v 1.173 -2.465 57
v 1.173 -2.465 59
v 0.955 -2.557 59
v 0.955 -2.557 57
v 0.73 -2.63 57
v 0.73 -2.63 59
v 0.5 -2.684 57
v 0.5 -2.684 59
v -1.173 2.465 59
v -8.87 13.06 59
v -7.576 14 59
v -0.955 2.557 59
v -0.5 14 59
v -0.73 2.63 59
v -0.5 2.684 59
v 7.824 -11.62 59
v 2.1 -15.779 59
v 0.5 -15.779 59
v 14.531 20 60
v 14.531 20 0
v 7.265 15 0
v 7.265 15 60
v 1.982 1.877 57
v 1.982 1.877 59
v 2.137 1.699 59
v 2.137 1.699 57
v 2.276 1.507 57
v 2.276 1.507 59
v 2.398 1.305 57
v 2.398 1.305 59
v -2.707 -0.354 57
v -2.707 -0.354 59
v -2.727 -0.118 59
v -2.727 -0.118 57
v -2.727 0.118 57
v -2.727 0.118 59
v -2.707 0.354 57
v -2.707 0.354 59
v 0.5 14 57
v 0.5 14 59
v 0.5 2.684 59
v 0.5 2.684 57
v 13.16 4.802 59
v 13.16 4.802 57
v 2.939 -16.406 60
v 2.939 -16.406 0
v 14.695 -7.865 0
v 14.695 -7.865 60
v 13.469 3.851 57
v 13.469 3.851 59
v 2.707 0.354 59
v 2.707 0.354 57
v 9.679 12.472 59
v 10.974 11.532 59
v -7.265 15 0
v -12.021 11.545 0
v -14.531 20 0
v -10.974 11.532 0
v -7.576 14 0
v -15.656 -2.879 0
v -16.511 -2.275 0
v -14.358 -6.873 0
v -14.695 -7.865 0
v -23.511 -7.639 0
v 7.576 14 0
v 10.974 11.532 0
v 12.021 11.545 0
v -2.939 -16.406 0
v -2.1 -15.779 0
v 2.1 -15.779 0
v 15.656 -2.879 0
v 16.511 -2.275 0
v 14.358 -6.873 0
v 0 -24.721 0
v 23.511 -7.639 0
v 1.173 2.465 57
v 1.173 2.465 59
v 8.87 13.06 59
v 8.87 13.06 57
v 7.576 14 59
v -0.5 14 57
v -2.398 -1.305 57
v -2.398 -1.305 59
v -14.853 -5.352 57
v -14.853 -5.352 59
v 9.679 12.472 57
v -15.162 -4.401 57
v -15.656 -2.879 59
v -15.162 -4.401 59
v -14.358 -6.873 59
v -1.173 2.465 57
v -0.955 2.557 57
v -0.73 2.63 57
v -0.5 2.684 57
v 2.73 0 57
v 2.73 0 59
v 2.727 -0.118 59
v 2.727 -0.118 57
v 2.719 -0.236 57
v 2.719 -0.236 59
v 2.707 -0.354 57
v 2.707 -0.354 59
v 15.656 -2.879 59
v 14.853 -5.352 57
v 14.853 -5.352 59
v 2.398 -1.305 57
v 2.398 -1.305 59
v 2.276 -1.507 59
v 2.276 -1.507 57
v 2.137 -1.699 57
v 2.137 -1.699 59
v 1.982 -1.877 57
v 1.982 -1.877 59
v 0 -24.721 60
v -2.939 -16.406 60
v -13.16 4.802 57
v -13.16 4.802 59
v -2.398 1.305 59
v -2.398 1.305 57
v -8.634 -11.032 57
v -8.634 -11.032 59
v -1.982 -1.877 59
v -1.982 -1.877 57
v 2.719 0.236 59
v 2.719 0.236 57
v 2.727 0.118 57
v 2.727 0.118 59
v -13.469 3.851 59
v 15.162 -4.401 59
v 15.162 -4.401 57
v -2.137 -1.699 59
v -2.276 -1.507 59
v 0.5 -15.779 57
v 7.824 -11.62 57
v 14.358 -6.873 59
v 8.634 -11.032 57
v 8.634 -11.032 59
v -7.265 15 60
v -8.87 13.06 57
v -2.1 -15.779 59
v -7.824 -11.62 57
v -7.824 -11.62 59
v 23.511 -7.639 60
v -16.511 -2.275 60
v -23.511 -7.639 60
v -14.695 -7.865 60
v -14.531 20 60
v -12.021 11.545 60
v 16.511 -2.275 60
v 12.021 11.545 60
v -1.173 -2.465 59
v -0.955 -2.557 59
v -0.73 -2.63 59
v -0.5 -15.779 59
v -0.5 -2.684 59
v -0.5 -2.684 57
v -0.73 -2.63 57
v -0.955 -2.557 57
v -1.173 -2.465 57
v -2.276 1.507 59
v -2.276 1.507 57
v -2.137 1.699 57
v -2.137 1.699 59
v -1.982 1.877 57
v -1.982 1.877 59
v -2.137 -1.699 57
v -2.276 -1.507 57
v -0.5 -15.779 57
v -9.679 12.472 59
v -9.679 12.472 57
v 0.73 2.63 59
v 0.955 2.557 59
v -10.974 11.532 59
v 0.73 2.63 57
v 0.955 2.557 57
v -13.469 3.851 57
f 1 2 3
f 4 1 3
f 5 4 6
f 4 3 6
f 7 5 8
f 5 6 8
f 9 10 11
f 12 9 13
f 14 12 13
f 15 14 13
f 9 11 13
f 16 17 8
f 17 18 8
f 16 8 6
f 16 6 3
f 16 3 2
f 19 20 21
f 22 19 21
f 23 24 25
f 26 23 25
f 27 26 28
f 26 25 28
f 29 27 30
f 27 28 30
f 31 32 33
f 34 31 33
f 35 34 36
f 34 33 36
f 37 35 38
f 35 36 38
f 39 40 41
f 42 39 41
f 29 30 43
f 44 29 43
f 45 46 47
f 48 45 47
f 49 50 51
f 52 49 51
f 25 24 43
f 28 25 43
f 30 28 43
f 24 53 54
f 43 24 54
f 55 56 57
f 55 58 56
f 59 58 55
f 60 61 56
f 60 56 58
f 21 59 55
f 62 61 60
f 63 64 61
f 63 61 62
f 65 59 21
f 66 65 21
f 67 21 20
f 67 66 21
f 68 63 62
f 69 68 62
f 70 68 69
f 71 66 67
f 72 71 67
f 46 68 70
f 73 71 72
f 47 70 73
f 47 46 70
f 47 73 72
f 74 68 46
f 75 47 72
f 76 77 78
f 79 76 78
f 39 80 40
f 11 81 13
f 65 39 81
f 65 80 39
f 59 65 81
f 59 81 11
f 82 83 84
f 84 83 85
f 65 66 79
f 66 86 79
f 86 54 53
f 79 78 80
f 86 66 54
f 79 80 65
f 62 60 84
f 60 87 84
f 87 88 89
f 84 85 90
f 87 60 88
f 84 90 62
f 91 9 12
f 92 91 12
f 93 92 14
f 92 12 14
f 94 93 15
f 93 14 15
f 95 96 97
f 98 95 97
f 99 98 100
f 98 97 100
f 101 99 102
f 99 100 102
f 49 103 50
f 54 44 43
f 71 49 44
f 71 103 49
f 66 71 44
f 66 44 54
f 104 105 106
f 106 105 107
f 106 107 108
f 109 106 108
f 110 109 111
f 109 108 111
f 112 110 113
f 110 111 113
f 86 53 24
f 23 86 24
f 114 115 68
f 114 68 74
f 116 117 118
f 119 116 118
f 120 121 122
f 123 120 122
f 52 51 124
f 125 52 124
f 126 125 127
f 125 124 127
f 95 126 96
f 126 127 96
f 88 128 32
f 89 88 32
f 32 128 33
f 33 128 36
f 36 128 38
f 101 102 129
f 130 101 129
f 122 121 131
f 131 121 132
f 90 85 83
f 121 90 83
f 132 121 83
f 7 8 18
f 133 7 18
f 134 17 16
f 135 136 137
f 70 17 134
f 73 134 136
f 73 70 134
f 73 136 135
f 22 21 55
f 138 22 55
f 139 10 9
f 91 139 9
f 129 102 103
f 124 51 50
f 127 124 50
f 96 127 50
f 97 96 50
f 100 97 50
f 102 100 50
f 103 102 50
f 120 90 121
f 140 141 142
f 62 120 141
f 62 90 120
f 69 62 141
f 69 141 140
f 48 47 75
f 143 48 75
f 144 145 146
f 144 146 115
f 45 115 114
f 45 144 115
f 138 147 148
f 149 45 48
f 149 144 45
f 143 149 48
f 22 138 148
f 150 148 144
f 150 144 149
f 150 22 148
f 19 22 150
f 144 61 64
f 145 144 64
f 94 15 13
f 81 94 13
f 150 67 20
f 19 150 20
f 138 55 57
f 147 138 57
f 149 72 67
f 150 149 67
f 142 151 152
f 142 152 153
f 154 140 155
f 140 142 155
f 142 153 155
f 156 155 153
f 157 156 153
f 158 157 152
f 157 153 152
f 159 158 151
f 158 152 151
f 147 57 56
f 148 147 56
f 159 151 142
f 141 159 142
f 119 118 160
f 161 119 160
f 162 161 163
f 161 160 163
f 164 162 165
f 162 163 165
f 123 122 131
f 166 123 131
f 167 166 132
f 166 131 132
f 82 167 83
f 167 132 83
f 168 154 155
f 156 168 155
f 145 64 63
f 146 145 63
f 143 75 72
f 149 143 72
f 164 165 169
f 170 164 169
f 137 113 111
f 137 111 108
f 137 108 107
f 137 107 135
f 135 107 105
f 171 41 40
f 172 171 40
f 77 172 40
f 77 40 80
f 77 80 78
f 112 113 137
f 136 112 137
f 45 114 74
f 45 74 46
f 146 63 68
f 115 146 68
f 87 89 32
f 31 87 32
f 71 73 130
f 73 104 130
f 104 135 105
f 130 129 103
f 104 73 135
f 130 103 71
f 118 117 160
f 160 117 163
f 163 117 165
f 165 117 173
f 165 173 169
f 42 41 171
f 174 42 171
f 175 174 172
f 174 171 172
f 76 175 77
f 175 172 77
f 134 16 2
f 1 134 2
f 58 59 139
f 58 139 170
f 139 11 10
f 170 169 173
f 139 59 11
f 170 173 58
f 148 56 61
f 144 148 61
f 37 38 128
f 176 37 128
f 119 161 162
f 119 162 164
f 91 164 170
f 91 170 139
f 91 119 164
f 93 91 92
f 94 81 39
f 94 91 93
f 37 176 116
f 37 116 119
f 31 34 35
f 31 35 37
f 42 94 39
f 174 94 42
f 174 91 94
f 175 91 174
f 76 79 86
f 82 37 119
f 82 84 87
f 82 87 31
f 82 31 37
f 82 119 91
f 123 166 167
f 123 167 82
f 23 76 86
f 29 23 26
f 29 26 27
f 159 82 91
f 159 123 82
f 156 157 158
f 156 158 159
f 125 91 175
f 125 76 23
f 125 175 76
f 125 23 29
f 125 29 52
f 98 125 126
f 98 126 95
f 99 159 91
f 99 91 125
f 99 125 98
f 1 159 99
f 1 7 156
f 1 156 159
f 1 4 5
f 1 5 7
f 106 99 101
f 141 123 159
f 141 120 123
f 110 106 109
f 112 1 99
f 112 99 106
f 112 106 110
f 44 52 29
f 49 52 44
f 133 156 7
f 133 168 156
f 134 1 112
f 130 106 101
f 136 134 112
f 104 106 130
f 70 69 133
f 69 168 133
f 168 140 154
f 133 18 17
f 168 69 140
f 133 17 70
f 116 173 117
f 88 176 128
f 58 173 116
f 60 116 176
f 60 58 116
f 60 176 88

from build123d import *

# Parameters (mm, degrees)
F1_DEPTH = 60
F2_T     = -1
F4_DEPTH = 59
F6_DEPTH = 2


with BuildPart() as f1:
    # F0 (on Top) → F1 (new body)
    with BuildSketch(Plane.XY):
        Polygon((-7.2654252801, 15), (-14.5308505601, 20), (-12.0207078615, 11.5450849719), (-10.8981379201, 15), align=None)
        Polygon((-10.8981379201, 15), (-12.0207078615, 11.5450849719), (-9.510565163, 3.0901699437), (-16.5109876273, -2.2745751406), (-17.6335575688, -5.7294901688), (-14.6946313073, -7.8647450844), (-5.8778525229, -8.0901699437), (-2.9389262615, -16.4057647469), (0, -18.5410196625), (2.9389262615, -16.4057647469), (5.8778525229, -8.0901699437), (14.6946313073, -7.8647450844), (17.6335575688, -5.7294901688), (16.5109876273, -2.2745751406), (9.510565163, 3.0901699437), (12.0207078615, 11.5450849719), (10.8981379201, 15), (7.2654252801, 15), (0, 10), (-7.2654252801, 15), align=None)
        Polygon((-9.510565163, 3.0901699437), (-12.0207078615, 11.5450849719), (-16.5109876273, -2.2745751406), align=None)
        Polygon((7.2654252801, 15), (-7.2654252801, 15), (0, 10), align=None)
        Polygon((-17.6335575688, -5.7294901688), (-16.5109876273, -2.2745751406), (-23.5114100917, -7.639320225), (-14.6946313073, -7.8647450844), align=None)
        Polygon((14.5308505601, 20), (7.2654252801, 15), (10.8981379201, 15), (12.0207078615, 11.5450849719), align=None)
        Polygon((-5.8778525229, -8.0901699437), (-14.6946313073, -7.8647450844), (-2.9389262615, -16.4057647469), align=None)
        Polygon((16.5109876273, -2.2745751406), (12.0207078615, 11.5450849719), (9.510565163, 3.0901699437), align=None)
        Polygon((0, -18.5410196625), (-2.9389262615, -16.4057647469), (0, -24.72135955), (2.9389262615, -16.4057647469), align=None)
        Polygon((23.5114100917, -7.639320225), (16.5109876273, -2.2745751406), (17.6335575688, -5.7294901688), (14.6946313073, -7.8647450844), align=None)
        Polygon((5.8778525229, -8.0901699437), (2.9389262615, -16.4057647469), (14.6946313073, -7.8647450844), align=None)
    extrude(amount=F1_DEPTH)

    # F2
    f2_openings = [f1.faces().sort_by_distance(p)[0] for p in [
        (0, 0, 0),
    ]]
    offset(amount=F2_T, openings=f2_openings, kind=Kind.INTERSECTION)

    # F3 (on face) → F4 (join, through all)
    with BuildSketch(Plane(origin=(0, 0, 59), x_dir=(1, 0, 0), z_dir=(0, 0, -1))):
        Polygon((-15.6559881063, 2.8792251681), (-14.3583265336, 6.8730168274), (-20.6573081254, 6.7119662811), align=None)
        Polygon((0, 21.7203791484), (-2.0996605306, 15.7794590151), (2.0996605306, 15.7794590151), align=None)
        Polygon((20.6573081254, 6.7119662811), (14.3583265336, 6.8730168274), (15.6559881063, 2.8792251681), align=None)
        Polygon((12.7669185376, -17.5721558553), (10.9735943499, -11.5317010106), (7.5762722465, -14), align=None)
        Polygon((-7.5762722465, -14), (-10.9735943499, -11.5317010106), (-12.7669185376, -17.5721558553), align=None)
    extrude(amount=F4_DEPTH)

    # F5 (on face) → F6 (join)
    with BuildSketch(Plane(origin=(0, 0, 59), x_dir=(1, 0, 0), z_dir=(0, 0, -1))):
        with BuildLine():
            ThreePointArc((-1.9818535798, 1.8771366278), (-2.208391982, 1.6044906934), (-2.3976894584, 1.3047876426))
            Line((-2.3976894584, 1.3047876426), (-1.3090169944, 0.9510565163))
            Line((-1.3090169944, 0.9510565163), (-1.9818535798, 1.8771366278))
        make_face()
        with BuildLine():
            Line((-1.3090169944, 0.9510565163), (-2.3976894584, 1.3047876426))
            ThreePointArc((-2.3976894584, 1.3047876426), (-2.5961204766, 0.8435306766), (-2.7067064528, 0.3537311263))
            Line((-2.7067064528, 0.3537311263), (-1.6180339887, 0))
            Line((-1.6180339887, 0), (-2.7067064528, -0.3537311263))
            ThreePointArc((-2.7067064528, -0.3537311263), (-2.5961204766, -0.8435306766), (-2.3976894584, -1.3047876426))
            Line((-2.3976894584, -1.3047876426), (-1.3090169944, -0.9510565163))
            Line((-1.3090169944, -0.9510565163), (-1.9818535798, -1.8771366278))
            ThreePointArc((-1.9818535798, -1.8771366278), (-1.6044906934, -2.208391982), (-1.1728365854, -2.4649218801))
            Line((-1.1728365854, -2.4649218801), (-0.5, -1.5388417686))
            Line((-0.5, -1.5388417686), (-0.5, -2.6835397391))
            ThreePointArc((-0.5, -2.6835397391), (1.21e-08, -2.7297226107), (0.5000000237, -2.6835397347))
            Line((0.5000000237, -2.6835397347), (0.5000000237, -1.5388418013))
            Line((0.5000000237, -1.5388418013), (1.1728365854, -2.4649218801))
            ThreePointArc((1.1728365854, -2.4649218801), (1.6044906934, -2.208391982), (1.9818535798, -1.8771366278))
            Line((1.9818535798, -1.8771366278), (1.3090169944, -0.9510565163))
            Line((1.3090169944, -0.9510565163), (2.3976894584, -1.3047876426))
            ThreePointArc((2.3976894584, -1.3047876426), (2.5961204766, -0.8435306766), (2.7067064528, -0.3537311263))
            Line((2.7067064528, -0.3537311263), (1.6180339887, 0))
            Line((1.6180339887, 0), (2.7067064528, 0.3537311263))
            ThreePointArc((2.7067064528, 0.3537311263), (2.5961204766, 0.8435306766), (2.3976894584, 1.3047876426))
            Line((2.3976894584, 1.3047876426), (1.3090169944, 0.9510565163))
            Line((1.3090169944, 0.9510565163), (1.9818535798, 1.8771366278))
            ThreePointArc((1.9818535798, 1.8771366278), (1.6044906934, 2.208391982), (1.1728365854, 2.4649218801))
            Line((1.1728365854, 2.4649218801), (0.5, 1.5388417686))
            Line((0.5, 1.5388417686), (0.5, 2.6835397391))
            ThreePointArc((0.5, 2.6835397391), (0, 2.7297226107), (-0.5, 2.6835397391))
            Line((-0.5, 2.6835397391), (-0.5, 1.5388417686))
            Line((-0.5, 1.5388417686), (-1.1728365854, 2.4649218801))
            ThreePointArc((-1.1728365854, 2.4649218801), (-1.6044906934, 2.208391982), (-1.9818535798, 1.8771366278))
            Line((-1.9818535798, 1.8771366278), (-1.3090169944, 0.9510565163))
        make_face()
        with BuildLine():
            Line((-1.6180339887, 0), (-2.7067064528, 0.3537311263))
            ThreePointArc((-2.7067064528, 0.3537311263), (-2.7297226107, 0), (-2.7067064528, -0.3537311263))
            Line((-2.7067064528, -0.3537311263), (-1.6180339887, 0))
        make_face()
        with BuildLine():
            ThreePointArc((-0.5, 2.6835397391), (-0.8435306766, 2.5961204766), (-1.1728365854, 2.4649218801))
            Line((-1.1728365854, 2.4649218801), (-0.5, 1.5388417686))
            Line((-0.5, 1.5388417686), (-0.5, 2.6835397391))
        make_face()
        with BuildLine():
            Line((-1.3090169944, -0.9510565163), (-2.3976894584, -1.3047876426))
            ThreePointArc((-2.3976894584, -1.3047876426), (-2.208391982, -1.6044906934), (-1.9818535798, -1.8771366278))
            Line((-1.9818535798, -1.8771366278), (-1.3090169944, -0.9510565163))
        make_face()
        with BuildLine():
            ThreePointArc((1.1728365854, 2.4649218801), (0.8435306766, 2.5961204766), (0.5, 2.6835397391))
            Line((0.5, 2.6835397391), (0.5, 1.5388417686))
            Line((0.5, 1.5388417686), (1.1728365854, 2.4649218801))
        make_face()
        with BuildLine():
            Line((-0.5, -1.5388417686), (-1.1728365854, -2.4649218801))
            ThreePointArc((-1.1728365854, -2.4649218801), (-0.8435306766, -2.5961204766), (-0.5, -2.6835397391))
            Line((-0.5, -2.6835397391), (-0.5, -1.5388417686))
        make_face()
        with BuildLine():
            ThreePointArc((2.3976894584, 1.3047876426), (2.208391982, 1.6044906934), (1.9818535798, 1.8771366278))
            Line((1.9818535798, 1.8771366278), (1.3090169944, 0.9510565163))
            Line((1.3090169944, 0.9510565163), (2.3976894584, 1.3047876426))
        make_face()
        with BuildLine():
            Line((0.5000000237, -1.5388418013), (0.5000000237, -2.6835397347))
            ThreePointArc((0.5000000237, -2.6835397347), (0.8435306881, -2.5961204728), (1.1728365854, -2.4649218801))
            Line((1.1728365854, -2.4649218801), (0.5000000237, -1.5388418013))
        make_face()
        with BuildLine():
            ThreePointArc((2.7297226107, 0), (2.7239624938, 0.1772395647), (2.7067064528, 0.3537311263))
            Line((2.7067064528, 0.3537311263), (1.6180339887, 0))
            Line((1.6180339887, 0), (2.7067064528, -0.3537311263))
            ThreePointArc((2.7067064528, -0.3537311263), (2.7239624938, -0.1772395647), (2.7297226107, 0))
        make_face()
        with BuildLine():
            Line((1.3090169944, -0.9510565163), (1.9818535798, -1.8771366278))
            ThreePointArc((1.9818535798, -1.8771366278), (2.208391982, -1.6044906934), (2.3976894584, -1.3047876426))
            Line((2.3976894584, -1.3047876426), (1.3090169944, -0.9510565163))
        make_face()
        with BuildLine():
            Line((-2.3976894584, 1.3047876426), (-14.8526488228, 5.3516492559))
            Line((-14.8526488228, 5.3516492559), (-15.1616658171, 4.4005927396))
            Line((-15.1616658171, 4.4005927396), (-2.7067064528, 0.3537311263))
            ThreePointArc((-2.7067064528, 0.3537311263), (-2.5961204766, 0.8435306766), (-2.3976894584, 1.3047876426))
        make_face()
        with BuildLine():
            Line((-8.6335020293, 11.0323452951), (-1.9818535798, 1.8771366278))
            ThreePointArc((-1.9818535798, 1.8771366278), (-1.6044906934, 2.208391982), (-1.1728365854, 2.4649218801))
            Line((-1.1728365854, 2.4649218801), (-7.8244850349, 11.6201305474))
            Line((-7.8244850349, 11.6201305474), (-8.6335020293, 11.0323452951))
        make_face()
        with BuildLine():
            Line((-0.5, 15.7794590151), (-0.5, 2.6835397391))
            ThreePointArc((-0.5, 2.6835397391), (0, 2.7297226107), (0.5, 2.6835397391))
            Line((0.5, 2.6835397391), (0.5, 15.7794590151))
            Line((0.5, 15.7794590151), (-0.5, 15.7794590151))
        make_face()
        with BuildLine():
            Line((7.8244850349, 11.6201305474), (1.1728365854, 2.4649218801))
            ThreePointArc((1.1728365854, 2.4649218801), (1.6044906934, 2.208391982), (1.9818535798, 1.8771366278))
            Line((1.9818535798, 1.8771366278), (8.6335020293, 11.0323452951))
            Line((8.6335020293, 11.0323452951), (7.8244850349, 11.6201305474))
        make_face()
        with BuildLine():
            Line((14.8526488228, 5.3516492559), (2.3976894584, 1.3047876426))
            ThreePointArc((2.3976894584, 1.3047876426), (2.5961204766, 0.8435306766), (2.7067064528, 0.3537311263))
            Line((2.7067064528, 0.3537311263), (15.1616658171, 4.4005927396))
            Line((15.1616658171, 4.4005927396), (14.8526488228, 5.3516492559))
        make_face()
        with BuildLine():
            Line((13.4692997253, -3.8507096631), (2.7067064528, -0.3537311263))
            ThreePointArc((2.7067064528, -0.3537311263), (2.5961204766, -0.8435306766), (2.3976894584, -1.3047876426))
            Line((2.3976894584, -1.3047876426), (13.1602827309, -4.8017661794))
            Line((13.1602827309, -4.8017661794), (13.4692997253, -3.8507096631))
        make_face()
        with BuildLine():
            ThreePointArc((1.9818535798, -1.8771366278), (1.6044906934, -2.208391982), (1.1728365854, -2.4649218801))
            Line((1.1728365854, -2.4649218801), (8.8704248011, -13.0597431314))
            Line((8.8704248011, -13.0597431314), (9.6794417954, -12.4719578791))
            Line((9.6794417954, -12.4719578791), (1.9818535798, -1.8771366278))
        make_face()
        with BuildLine():
            ThreePointArc((0.5000000237, -2.6835397347), (1.21e-08, -2.7297226107), (-0.5, -2.6835397391))
            Line((-0.5, -2.6835397391), (-0.5, -14))
            Line((-0.5, -14), (0.5000000237, -14))
            Line((0.5000000237, -14), (0.5000000237, -2.6835397347))
        make_face()
        with BuildLine():
            ThreePointArc((-1.1728365854, -2.4649218801), (-1.6044906934, -2.208391982), (-1.9818535798, -1.8771366278))
            Line((-1.9818535798, -1.8771366278), (-9.6794417954, -12.4719578791))
            Line((-9.6794417954, -12.4719578791), (-8.8704248011, -13.0597431314))
            Line((-8.8704248011, -13.0597431314), (-1.1728365854, -2.4649218801))
        make_face()
        with BuildLine():
            ThreePointArc((-2.3976894584, -1.3047876426), (-2.5961204766, -0.8435306766), (-2.7067064528, -0.3537311263))
            Line((-2.7067064528, -0.3537311263), (-13.4692997253, -3.8507096631))
            Line((-13.4692997253, -3.8507096631), (-13.1602827309, -4.8017661794))
            Line((-13.1602827309, -4.8017661794), (-2.3976894584, -1.3047876426))
        make_face()
    extrude(amount=F6_DEPTH)


solid = f1.part
